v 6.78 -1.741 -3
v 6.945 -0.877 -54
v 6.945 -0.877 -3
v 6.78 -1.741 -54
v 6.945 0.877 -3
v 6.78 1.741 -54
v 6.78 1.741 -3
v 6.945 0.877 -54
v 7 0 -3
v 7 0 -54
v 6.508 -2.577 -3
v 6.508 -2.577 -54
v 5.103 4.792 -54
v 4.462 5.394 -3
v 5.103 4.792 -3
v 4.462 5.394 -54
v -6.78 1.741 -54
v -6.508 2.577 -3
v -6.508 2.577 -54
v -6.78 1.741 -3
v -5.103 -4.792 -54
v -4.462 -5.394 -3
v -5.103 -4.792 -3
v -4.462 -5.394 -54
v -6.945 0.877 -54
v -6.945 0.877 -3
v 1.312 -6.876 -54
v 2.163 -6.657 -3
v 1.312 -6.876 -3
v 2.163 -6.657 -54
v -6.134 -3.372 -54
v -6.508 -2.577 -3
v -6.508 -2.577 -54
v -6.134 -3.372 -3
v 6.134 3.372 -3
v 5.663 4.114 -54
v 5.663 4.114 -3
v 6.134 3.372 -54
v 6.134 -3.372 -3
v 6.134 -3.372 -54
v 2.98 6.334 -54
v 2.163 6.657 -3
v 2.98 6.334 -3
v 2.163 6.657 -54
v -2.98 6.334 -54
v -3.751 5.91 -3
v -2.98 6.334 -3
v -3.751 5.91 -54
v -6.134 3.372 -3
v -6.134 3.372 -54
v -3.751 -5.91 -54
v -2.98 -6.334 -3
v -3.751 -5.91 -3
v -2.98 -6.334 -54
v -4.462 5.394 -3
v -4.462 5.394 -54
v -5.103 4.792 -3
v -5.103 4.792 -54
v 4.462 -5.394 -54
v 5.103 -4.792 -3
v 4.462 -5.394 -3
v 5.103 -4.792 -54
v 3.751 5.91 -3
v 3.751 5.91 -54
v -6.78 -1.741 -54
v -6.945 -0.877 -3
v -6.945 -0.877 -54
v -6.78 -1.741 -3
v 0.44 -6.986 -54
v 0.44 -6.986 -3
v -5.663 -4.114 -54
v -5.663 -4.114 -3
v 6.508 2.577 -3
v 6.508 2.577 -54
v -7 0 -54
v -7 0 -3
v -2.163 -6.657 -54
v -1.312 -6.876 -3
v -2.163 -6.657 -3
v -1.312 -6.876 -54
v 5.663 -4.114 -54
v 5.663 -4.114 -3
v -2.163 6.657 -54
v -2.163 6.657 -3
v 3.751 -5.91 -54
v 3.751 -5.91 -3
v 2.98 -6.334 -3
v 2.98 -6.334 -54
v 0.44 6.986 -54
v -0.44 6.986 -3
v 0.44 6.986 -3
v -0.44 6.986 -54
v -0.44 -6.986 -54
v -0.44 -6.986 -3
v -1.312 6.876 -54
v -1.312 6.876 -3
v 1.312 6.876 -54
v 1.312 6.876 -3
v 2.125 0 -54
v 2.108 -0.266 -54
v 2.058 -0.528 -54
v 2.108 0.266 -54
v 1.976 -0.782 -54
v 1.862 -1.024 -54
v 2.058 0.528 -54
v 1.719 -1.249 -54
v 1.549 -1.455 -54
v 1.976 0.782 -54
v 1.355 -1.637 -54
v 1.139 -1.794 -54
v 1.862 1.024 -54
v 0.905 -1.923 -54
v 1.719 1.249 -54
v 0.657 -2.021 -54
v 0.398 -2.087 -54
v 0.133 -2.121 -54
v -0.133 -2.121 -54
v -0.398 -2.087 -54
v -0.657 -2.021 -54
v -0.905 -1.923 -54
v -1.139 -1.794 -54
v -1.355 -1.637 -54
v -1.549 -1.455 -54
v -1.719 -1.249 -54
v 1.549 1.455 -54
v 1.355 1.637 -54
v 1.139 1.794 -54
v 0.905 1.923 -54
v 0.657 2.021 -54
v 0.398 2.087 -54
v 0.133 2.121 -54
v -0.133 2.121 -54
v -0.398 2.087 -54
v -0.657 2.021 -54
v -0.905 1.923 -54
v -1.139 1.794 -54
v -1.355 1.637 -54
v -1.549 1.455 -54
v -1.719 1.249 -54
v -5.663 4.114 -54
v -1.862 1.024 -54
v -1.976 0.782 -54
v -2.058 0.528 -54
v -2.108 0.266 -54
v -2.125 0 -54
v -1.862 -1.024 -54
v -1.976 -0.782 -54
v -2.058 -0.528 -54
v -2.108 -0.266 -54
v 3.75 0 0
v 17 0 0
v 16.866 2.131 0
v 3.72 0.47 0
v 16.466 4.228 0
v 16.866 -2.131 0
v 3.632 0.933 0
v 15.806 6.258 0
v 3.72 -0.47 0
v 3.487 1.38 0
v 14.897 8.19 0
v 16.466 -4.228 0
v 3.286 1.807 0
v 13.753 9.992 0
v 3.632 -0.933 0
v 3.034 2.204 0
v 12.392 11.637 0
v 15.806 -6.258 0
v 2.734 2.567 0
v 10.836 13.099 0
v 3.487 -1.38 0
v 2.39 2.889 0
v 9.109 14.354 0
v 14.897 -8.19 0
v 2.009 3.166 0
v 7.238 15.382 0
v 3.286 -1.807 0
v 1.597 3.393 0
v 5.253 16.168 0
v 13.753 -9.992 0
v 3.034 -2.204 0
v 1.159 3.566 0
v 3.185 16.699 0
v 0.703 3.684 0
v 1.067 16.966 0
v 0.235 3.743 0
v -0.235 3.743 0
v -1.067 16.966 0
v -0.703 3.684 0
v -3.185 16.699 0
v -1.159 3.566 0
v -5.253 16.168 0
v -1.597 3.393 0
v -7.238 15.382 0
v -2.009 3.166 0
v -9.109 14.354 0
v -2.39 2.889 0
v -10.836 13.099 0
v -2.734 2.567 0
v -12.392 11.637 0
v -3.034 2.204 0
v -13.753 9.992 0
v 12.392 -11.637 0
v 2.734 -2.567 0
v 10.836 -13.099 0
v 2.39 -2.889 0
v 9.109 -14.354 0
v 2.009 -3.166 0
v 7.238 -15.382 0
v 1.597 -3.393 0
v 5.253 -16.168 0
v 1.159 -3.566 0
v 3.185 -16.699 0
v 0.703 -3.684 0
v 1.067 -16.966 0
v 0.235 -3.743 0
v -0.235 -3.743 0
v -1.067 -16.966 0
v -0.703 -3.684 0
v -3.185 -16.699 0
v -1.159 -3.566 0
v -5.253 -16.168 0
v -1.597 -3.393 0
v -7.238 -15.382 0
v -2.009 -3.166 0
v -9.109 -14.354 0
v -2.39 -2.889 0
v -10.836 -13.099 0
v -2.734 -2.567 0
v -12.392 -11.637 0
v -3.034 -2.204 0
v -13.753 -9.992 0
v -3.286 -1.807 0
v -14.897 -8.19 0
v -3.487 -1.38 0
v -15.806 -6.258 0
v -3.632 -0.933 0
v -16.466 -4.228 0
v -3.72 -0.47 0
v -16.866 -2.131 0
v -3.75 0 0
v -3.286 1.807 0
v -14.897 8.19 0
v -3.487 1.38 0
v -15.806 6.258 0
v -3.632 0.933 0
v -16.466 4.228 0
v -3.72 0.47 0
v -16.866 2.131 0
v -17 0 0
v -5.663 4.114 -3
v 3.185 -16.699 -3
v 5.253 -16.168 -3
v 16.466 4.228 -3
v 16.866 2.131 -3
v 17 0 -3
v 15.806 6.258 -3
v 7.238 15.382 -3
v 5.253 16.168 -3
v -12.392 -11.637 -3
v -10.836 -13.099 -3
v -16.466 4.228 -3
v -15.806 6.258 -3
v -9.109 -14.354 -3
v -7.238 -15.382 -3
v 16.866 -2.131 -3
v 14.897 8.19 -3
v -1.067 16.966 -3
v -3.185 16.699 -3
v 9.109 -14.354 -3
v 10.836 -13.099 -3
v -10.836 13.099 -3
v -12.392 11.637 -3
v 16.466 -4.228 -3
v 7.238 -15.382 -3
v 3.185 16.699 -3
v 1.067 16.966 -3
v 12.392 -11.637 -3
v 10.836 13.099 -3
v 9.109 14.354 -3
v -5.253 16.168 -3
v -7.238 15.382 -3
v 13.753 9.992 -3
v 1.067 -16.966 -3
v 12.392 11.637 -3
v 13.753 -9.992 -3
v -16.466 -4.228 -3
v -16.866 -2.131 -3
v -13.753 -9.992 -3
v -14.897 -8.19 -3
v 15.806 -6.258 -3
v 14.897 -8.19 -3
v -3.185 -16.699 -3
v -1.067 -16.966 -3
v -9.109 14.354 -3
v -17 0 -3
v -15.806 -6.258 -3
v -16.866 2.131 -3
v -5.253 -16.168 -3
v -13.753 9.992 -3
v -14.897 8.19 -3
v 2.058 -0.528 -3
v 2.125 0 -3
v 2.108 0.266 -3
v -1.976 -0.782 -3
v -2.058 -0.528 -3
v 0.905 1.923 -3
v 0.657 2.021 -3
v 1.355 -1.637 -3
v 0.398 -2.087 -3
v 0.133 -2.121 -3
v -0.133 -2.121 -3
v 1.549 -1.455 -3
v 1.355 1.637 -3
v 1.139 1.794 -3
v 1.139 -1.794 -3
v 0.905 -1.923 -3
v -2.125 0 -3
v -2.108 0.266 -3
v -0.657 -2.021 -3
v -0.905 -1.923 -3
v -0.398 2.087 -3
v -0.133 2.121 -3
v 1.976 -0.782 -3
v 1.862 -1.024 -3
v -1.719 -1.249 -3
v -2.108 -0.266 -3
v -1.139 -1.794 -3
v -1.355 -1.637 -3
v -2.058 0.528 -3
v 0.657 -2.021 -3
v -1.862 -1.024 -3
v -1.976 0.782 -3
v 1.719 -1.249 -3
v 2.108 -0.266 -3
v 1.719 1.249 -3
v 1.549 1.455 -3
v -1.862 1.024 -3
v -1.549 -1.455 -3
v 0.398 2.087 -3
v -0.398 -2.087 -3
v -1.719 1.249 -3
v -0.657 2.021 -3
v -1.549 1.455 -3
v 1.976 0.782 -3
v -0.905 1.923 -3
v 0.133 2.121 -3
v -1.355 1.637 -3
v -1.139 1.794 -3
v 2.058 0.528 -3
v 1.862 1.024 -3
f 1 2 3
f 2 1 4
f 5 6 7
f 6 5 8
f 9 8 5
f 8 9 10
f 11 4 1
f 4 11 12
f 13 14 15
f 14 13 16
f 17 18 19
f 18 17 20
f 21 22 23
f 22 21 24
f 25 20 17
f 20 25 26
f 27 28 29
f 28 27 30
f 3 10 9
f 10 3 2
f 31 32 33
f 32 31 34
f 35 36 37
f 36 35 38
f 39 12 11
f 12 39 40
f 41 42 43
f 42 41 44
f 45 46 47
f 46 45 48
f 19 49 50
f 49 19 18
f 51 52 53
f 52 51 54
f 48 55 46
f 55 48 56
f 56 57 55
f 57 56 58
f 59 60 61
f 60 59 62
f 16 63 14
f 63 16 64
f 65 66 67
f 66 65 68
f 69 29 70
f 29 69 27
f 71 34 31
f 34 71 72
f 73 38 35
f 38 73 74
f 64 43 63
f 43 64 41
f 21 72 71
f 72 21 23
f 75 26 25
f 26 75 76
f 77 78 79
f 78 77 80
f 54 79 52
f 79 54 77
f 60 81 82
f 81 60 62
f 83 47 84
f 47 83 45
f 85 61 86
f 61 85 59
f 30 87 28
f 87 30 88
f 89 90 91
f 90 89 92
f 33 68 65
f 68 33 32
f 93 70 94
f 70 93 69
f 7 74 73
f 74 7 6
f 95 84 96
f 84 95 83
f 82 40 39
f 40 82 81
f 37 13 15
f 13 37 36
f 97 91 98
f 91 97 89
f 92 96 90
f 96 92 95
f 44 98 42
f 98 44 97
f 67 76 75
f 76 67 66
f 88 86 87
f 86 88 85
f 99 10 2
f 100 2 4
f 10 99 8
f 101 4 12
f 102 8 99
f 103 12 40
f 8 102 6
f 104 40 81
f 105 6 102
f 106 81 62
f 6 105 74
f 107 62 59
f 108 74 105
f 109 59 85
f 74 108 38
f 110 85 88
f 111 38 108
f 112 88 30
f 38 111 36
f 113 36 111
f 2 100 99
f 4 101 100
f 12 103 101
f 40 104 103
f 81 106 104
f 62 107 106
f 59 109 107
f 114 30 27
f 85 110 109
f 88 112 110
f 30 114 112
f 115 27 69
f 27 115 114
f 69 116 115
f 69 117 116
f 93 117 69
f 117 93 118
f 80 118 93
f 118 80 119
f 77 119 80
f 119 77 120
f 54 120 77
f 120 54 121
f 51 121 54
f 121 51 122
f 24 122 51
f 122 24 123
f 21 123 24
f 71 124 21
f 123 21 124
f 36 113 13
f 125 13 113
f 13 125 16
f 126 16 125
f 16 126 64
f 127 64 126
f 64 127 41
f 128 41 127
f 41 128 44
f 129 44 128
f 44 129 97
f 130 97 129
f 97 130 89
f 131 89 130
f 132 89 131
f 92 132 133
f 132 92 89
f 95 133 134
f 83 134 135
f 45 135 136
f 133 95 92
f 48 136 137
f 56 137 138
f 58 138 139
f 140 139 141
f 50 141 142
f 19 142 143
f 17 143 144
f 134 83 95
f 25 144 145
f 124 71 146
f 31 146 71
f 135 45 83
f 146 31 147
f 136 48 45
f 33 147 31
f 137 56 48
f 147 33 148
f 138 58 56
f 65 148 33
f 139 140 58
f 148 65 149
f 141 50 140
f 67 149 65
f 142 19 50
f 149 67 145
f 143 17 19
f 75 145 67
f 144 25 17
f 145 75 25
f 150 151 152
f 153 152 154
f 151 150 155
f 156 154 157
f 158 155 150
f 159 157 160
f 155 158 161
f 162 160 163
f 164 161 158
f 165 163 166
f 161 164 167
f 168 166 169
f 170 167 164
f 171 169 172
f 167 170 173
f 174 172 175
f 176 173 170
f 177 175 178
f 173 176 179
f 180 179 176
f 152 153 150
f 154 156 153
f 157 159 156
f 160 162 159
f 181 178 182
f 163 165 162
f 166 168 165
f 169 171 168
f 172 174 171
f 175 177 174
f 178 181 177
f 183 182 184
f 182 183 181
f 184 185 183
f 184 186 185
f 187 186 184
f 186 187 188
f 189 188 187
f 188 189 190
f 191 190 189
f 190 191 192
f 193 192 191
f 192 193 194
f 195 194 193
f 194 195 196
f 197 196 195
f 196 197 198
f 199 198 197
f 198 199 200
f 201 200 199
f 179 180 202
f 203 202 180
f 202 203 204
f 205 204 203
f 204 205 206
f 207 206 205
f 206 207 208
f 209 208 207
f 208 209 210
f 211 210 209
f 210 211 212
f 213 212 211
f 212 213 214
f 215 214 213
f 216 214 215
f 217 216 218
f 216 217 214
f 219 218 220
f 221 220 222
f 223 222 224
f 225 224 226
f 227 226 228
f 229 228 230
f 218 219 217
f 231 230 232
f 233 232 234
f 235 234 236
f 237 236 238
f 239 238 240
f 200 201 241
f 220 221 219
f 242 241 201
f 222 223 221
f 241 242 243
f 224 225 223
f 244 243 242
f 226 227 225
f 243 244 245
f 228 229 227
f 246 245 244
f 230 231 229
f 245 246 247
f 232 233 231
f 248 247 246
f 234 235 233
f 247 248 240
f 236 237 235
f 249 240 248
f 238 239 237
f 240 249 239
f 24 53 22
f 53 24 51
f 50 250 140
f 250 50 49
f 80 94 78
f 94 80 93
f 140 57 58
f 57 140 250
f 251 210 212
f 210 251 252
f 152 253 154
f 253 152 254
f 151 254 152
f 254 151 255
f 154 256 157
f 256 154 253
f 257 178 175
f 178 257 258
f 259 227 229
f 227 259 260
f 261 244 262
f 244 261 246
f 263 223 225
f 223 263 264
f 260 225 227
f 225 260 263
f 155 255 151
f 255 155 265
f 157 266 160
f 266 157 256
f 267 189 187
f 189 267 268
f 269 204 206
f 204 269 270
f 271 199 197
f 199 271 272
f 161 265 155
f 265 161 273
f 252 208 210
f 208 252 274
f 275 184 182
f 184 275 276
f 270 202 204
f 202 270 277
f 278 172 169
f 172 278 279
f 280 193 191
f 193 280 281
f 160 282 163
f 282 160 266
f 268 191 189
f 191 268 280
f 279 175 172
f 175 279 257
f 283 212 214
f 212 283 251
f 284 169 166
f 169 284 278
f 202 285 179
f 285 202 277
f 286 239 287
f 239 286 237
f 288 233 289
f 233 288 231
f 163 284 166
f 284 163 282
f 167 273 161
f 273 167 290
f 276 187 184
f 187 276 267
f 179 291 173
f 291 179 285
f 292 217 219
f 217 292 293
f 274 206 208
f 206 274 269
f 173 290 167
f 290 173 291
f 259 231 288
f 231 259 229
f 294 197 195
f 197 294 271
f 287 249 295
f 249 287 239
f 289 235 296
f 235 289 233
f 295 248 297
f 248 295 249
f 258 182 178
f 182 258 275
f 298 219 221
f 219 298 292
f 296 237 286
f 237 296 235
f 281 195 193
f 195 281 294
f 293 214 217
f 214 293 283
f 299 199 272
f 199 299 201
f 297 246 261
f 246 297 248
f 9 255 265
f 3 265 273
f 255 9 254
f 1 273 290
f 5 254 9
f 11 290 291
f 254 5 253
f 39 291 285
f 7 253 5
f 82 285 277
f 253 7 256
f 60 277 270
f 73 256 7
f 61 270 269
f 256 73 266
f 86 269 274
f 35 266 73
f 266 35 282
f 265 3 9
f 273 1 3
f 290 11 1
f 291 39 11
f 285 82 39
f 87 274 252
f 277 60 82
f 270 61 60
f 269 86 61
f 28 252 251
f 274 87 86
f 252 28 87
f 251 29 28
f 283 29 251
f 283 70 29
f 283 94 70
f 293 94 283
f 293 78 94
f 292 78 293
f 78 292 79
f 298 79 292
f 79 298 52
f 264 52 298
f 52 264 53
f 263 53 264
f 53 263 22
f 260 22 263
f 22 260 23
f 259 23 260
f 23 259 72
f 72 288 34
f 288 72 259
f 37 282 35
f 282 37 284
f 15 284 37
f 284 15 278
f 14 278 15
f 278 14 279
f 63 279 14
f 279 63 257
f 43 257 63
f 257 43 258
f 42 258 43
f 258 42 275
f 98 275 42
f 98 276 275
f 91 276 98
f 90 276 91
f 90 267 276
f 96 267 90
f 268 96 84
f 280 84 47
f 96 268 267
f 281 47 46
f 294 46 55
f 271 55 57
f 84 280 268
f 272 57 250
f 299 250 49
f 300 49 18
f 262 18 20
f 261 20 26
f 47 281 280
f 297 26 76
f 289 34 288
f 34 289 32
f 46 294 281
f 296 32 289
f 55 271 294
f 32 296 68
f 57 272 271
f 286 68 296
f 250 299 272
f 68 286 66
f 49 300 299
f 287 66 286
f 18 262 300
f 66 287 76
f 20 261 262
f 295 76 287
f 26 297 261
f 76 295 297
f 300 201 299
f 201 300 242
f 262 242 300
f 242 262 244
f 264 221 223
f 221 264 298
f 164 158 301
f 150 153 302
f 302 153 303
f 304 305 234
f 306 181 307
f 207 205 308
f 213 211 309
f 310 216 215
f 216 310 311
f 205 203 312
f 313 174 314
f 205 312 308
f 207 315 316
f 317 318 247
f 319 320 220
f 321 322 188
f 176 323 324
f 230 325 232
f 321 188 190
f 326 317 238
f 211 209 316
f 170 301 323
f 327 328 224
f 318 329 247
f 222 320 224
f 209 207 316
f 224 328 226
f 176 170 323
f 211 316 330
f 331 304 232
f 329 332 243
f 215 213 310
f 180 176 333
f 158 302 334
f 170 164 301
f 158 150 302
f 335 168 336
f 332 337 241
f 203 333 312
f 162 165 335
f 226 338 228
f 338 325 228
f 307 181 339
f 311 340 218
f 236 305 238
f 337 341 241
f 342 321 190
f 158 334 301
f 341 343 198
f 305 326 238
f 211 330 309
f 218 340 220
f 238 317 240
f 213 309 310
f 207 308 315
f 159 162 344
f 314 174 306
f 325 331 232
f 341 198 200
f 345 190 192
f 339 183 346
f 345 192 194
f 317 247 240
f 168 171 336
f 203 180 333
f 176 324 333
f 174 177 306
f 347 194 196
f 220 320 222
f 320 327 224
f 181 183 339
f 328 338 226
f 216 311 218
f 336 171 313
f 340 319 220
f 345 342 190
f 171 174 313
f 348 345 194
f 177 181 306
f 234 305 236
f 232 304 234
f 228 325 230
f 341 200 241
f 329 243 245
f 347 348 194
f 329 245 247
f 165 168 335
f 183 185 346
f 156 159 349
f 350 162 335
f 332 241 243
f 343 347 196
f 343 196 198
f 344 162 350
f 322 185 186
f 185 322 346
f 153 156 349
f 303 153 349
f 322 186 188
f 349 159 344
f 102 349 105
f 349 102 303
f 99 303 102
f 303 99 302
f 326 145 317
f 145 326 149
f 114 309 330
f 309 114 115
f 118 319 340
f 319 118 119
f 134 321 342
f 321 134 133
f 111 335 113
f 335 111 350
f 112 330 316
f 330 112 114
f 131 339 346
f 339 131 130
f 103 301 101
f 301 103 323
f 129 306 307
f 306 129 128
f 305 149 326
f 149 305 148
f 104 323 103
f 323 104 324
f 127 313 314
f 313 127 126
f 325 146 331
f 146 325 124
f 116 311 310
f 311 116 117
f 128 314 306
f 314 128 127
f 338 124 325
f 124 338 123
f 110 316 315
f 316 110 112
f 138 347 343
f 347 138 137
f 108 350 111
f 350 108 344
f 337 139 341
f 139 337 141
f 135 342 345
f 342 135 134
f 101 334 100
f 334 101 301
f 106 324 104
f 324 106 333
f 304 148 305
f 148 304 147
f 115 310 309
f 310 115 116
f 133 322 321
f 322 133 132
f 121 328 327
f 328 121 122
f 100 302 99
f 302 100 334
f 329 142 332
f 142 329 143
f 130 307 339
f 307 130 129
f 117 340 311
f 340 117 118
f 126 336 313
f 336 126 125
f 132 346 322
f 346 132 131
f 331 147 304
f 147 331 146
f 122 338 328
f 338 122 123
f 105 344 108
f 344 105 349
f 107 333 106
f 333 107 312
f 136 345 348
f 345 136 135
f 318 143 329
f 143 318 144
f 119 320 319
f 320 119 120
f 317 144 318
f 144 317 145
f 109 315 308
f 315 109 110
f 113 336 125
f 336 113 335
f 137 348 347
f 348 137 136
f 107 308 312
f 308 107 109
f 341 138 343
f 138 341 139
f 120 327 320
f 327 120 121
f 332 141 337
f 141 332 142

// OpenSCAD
$fn = 50;


difference() {
	union() {
		translate(v = [0, 0, -54.0000000000]) {
			cylinder(h = 54, r = 7.0000000000);
		}
		translate(v = [0, 0, -3.0000000000]) {
			cylinder(h = 3, r = 17.0000000000);
		}
	}
	union() {
		translate(v = [0, 0, 0]) {
			rotate(a = [0, 0, 0]) {
				difference() {
					union() {
						#translate(v = [0, 0, -54.0000000000]) {
							cylinder(h = 54, r = 2.0000000000);
						}
						#translate(v = [0, 0, -3]) {
							cylinder(h = 3, r1 = 2.1250000000, r2 = 3.7500000000);
						}
						#translate(v = [0, 0, -54.0000000000]) {
							cylinder(h = 54, r = 2.1250000000);
						}
						#translate(v = [0, 0, -54.0000000000]) {
							cylinder(h = 54, r = 2.0000000000);
						}
					}
					union();
				}
			}
		}
	}
}
